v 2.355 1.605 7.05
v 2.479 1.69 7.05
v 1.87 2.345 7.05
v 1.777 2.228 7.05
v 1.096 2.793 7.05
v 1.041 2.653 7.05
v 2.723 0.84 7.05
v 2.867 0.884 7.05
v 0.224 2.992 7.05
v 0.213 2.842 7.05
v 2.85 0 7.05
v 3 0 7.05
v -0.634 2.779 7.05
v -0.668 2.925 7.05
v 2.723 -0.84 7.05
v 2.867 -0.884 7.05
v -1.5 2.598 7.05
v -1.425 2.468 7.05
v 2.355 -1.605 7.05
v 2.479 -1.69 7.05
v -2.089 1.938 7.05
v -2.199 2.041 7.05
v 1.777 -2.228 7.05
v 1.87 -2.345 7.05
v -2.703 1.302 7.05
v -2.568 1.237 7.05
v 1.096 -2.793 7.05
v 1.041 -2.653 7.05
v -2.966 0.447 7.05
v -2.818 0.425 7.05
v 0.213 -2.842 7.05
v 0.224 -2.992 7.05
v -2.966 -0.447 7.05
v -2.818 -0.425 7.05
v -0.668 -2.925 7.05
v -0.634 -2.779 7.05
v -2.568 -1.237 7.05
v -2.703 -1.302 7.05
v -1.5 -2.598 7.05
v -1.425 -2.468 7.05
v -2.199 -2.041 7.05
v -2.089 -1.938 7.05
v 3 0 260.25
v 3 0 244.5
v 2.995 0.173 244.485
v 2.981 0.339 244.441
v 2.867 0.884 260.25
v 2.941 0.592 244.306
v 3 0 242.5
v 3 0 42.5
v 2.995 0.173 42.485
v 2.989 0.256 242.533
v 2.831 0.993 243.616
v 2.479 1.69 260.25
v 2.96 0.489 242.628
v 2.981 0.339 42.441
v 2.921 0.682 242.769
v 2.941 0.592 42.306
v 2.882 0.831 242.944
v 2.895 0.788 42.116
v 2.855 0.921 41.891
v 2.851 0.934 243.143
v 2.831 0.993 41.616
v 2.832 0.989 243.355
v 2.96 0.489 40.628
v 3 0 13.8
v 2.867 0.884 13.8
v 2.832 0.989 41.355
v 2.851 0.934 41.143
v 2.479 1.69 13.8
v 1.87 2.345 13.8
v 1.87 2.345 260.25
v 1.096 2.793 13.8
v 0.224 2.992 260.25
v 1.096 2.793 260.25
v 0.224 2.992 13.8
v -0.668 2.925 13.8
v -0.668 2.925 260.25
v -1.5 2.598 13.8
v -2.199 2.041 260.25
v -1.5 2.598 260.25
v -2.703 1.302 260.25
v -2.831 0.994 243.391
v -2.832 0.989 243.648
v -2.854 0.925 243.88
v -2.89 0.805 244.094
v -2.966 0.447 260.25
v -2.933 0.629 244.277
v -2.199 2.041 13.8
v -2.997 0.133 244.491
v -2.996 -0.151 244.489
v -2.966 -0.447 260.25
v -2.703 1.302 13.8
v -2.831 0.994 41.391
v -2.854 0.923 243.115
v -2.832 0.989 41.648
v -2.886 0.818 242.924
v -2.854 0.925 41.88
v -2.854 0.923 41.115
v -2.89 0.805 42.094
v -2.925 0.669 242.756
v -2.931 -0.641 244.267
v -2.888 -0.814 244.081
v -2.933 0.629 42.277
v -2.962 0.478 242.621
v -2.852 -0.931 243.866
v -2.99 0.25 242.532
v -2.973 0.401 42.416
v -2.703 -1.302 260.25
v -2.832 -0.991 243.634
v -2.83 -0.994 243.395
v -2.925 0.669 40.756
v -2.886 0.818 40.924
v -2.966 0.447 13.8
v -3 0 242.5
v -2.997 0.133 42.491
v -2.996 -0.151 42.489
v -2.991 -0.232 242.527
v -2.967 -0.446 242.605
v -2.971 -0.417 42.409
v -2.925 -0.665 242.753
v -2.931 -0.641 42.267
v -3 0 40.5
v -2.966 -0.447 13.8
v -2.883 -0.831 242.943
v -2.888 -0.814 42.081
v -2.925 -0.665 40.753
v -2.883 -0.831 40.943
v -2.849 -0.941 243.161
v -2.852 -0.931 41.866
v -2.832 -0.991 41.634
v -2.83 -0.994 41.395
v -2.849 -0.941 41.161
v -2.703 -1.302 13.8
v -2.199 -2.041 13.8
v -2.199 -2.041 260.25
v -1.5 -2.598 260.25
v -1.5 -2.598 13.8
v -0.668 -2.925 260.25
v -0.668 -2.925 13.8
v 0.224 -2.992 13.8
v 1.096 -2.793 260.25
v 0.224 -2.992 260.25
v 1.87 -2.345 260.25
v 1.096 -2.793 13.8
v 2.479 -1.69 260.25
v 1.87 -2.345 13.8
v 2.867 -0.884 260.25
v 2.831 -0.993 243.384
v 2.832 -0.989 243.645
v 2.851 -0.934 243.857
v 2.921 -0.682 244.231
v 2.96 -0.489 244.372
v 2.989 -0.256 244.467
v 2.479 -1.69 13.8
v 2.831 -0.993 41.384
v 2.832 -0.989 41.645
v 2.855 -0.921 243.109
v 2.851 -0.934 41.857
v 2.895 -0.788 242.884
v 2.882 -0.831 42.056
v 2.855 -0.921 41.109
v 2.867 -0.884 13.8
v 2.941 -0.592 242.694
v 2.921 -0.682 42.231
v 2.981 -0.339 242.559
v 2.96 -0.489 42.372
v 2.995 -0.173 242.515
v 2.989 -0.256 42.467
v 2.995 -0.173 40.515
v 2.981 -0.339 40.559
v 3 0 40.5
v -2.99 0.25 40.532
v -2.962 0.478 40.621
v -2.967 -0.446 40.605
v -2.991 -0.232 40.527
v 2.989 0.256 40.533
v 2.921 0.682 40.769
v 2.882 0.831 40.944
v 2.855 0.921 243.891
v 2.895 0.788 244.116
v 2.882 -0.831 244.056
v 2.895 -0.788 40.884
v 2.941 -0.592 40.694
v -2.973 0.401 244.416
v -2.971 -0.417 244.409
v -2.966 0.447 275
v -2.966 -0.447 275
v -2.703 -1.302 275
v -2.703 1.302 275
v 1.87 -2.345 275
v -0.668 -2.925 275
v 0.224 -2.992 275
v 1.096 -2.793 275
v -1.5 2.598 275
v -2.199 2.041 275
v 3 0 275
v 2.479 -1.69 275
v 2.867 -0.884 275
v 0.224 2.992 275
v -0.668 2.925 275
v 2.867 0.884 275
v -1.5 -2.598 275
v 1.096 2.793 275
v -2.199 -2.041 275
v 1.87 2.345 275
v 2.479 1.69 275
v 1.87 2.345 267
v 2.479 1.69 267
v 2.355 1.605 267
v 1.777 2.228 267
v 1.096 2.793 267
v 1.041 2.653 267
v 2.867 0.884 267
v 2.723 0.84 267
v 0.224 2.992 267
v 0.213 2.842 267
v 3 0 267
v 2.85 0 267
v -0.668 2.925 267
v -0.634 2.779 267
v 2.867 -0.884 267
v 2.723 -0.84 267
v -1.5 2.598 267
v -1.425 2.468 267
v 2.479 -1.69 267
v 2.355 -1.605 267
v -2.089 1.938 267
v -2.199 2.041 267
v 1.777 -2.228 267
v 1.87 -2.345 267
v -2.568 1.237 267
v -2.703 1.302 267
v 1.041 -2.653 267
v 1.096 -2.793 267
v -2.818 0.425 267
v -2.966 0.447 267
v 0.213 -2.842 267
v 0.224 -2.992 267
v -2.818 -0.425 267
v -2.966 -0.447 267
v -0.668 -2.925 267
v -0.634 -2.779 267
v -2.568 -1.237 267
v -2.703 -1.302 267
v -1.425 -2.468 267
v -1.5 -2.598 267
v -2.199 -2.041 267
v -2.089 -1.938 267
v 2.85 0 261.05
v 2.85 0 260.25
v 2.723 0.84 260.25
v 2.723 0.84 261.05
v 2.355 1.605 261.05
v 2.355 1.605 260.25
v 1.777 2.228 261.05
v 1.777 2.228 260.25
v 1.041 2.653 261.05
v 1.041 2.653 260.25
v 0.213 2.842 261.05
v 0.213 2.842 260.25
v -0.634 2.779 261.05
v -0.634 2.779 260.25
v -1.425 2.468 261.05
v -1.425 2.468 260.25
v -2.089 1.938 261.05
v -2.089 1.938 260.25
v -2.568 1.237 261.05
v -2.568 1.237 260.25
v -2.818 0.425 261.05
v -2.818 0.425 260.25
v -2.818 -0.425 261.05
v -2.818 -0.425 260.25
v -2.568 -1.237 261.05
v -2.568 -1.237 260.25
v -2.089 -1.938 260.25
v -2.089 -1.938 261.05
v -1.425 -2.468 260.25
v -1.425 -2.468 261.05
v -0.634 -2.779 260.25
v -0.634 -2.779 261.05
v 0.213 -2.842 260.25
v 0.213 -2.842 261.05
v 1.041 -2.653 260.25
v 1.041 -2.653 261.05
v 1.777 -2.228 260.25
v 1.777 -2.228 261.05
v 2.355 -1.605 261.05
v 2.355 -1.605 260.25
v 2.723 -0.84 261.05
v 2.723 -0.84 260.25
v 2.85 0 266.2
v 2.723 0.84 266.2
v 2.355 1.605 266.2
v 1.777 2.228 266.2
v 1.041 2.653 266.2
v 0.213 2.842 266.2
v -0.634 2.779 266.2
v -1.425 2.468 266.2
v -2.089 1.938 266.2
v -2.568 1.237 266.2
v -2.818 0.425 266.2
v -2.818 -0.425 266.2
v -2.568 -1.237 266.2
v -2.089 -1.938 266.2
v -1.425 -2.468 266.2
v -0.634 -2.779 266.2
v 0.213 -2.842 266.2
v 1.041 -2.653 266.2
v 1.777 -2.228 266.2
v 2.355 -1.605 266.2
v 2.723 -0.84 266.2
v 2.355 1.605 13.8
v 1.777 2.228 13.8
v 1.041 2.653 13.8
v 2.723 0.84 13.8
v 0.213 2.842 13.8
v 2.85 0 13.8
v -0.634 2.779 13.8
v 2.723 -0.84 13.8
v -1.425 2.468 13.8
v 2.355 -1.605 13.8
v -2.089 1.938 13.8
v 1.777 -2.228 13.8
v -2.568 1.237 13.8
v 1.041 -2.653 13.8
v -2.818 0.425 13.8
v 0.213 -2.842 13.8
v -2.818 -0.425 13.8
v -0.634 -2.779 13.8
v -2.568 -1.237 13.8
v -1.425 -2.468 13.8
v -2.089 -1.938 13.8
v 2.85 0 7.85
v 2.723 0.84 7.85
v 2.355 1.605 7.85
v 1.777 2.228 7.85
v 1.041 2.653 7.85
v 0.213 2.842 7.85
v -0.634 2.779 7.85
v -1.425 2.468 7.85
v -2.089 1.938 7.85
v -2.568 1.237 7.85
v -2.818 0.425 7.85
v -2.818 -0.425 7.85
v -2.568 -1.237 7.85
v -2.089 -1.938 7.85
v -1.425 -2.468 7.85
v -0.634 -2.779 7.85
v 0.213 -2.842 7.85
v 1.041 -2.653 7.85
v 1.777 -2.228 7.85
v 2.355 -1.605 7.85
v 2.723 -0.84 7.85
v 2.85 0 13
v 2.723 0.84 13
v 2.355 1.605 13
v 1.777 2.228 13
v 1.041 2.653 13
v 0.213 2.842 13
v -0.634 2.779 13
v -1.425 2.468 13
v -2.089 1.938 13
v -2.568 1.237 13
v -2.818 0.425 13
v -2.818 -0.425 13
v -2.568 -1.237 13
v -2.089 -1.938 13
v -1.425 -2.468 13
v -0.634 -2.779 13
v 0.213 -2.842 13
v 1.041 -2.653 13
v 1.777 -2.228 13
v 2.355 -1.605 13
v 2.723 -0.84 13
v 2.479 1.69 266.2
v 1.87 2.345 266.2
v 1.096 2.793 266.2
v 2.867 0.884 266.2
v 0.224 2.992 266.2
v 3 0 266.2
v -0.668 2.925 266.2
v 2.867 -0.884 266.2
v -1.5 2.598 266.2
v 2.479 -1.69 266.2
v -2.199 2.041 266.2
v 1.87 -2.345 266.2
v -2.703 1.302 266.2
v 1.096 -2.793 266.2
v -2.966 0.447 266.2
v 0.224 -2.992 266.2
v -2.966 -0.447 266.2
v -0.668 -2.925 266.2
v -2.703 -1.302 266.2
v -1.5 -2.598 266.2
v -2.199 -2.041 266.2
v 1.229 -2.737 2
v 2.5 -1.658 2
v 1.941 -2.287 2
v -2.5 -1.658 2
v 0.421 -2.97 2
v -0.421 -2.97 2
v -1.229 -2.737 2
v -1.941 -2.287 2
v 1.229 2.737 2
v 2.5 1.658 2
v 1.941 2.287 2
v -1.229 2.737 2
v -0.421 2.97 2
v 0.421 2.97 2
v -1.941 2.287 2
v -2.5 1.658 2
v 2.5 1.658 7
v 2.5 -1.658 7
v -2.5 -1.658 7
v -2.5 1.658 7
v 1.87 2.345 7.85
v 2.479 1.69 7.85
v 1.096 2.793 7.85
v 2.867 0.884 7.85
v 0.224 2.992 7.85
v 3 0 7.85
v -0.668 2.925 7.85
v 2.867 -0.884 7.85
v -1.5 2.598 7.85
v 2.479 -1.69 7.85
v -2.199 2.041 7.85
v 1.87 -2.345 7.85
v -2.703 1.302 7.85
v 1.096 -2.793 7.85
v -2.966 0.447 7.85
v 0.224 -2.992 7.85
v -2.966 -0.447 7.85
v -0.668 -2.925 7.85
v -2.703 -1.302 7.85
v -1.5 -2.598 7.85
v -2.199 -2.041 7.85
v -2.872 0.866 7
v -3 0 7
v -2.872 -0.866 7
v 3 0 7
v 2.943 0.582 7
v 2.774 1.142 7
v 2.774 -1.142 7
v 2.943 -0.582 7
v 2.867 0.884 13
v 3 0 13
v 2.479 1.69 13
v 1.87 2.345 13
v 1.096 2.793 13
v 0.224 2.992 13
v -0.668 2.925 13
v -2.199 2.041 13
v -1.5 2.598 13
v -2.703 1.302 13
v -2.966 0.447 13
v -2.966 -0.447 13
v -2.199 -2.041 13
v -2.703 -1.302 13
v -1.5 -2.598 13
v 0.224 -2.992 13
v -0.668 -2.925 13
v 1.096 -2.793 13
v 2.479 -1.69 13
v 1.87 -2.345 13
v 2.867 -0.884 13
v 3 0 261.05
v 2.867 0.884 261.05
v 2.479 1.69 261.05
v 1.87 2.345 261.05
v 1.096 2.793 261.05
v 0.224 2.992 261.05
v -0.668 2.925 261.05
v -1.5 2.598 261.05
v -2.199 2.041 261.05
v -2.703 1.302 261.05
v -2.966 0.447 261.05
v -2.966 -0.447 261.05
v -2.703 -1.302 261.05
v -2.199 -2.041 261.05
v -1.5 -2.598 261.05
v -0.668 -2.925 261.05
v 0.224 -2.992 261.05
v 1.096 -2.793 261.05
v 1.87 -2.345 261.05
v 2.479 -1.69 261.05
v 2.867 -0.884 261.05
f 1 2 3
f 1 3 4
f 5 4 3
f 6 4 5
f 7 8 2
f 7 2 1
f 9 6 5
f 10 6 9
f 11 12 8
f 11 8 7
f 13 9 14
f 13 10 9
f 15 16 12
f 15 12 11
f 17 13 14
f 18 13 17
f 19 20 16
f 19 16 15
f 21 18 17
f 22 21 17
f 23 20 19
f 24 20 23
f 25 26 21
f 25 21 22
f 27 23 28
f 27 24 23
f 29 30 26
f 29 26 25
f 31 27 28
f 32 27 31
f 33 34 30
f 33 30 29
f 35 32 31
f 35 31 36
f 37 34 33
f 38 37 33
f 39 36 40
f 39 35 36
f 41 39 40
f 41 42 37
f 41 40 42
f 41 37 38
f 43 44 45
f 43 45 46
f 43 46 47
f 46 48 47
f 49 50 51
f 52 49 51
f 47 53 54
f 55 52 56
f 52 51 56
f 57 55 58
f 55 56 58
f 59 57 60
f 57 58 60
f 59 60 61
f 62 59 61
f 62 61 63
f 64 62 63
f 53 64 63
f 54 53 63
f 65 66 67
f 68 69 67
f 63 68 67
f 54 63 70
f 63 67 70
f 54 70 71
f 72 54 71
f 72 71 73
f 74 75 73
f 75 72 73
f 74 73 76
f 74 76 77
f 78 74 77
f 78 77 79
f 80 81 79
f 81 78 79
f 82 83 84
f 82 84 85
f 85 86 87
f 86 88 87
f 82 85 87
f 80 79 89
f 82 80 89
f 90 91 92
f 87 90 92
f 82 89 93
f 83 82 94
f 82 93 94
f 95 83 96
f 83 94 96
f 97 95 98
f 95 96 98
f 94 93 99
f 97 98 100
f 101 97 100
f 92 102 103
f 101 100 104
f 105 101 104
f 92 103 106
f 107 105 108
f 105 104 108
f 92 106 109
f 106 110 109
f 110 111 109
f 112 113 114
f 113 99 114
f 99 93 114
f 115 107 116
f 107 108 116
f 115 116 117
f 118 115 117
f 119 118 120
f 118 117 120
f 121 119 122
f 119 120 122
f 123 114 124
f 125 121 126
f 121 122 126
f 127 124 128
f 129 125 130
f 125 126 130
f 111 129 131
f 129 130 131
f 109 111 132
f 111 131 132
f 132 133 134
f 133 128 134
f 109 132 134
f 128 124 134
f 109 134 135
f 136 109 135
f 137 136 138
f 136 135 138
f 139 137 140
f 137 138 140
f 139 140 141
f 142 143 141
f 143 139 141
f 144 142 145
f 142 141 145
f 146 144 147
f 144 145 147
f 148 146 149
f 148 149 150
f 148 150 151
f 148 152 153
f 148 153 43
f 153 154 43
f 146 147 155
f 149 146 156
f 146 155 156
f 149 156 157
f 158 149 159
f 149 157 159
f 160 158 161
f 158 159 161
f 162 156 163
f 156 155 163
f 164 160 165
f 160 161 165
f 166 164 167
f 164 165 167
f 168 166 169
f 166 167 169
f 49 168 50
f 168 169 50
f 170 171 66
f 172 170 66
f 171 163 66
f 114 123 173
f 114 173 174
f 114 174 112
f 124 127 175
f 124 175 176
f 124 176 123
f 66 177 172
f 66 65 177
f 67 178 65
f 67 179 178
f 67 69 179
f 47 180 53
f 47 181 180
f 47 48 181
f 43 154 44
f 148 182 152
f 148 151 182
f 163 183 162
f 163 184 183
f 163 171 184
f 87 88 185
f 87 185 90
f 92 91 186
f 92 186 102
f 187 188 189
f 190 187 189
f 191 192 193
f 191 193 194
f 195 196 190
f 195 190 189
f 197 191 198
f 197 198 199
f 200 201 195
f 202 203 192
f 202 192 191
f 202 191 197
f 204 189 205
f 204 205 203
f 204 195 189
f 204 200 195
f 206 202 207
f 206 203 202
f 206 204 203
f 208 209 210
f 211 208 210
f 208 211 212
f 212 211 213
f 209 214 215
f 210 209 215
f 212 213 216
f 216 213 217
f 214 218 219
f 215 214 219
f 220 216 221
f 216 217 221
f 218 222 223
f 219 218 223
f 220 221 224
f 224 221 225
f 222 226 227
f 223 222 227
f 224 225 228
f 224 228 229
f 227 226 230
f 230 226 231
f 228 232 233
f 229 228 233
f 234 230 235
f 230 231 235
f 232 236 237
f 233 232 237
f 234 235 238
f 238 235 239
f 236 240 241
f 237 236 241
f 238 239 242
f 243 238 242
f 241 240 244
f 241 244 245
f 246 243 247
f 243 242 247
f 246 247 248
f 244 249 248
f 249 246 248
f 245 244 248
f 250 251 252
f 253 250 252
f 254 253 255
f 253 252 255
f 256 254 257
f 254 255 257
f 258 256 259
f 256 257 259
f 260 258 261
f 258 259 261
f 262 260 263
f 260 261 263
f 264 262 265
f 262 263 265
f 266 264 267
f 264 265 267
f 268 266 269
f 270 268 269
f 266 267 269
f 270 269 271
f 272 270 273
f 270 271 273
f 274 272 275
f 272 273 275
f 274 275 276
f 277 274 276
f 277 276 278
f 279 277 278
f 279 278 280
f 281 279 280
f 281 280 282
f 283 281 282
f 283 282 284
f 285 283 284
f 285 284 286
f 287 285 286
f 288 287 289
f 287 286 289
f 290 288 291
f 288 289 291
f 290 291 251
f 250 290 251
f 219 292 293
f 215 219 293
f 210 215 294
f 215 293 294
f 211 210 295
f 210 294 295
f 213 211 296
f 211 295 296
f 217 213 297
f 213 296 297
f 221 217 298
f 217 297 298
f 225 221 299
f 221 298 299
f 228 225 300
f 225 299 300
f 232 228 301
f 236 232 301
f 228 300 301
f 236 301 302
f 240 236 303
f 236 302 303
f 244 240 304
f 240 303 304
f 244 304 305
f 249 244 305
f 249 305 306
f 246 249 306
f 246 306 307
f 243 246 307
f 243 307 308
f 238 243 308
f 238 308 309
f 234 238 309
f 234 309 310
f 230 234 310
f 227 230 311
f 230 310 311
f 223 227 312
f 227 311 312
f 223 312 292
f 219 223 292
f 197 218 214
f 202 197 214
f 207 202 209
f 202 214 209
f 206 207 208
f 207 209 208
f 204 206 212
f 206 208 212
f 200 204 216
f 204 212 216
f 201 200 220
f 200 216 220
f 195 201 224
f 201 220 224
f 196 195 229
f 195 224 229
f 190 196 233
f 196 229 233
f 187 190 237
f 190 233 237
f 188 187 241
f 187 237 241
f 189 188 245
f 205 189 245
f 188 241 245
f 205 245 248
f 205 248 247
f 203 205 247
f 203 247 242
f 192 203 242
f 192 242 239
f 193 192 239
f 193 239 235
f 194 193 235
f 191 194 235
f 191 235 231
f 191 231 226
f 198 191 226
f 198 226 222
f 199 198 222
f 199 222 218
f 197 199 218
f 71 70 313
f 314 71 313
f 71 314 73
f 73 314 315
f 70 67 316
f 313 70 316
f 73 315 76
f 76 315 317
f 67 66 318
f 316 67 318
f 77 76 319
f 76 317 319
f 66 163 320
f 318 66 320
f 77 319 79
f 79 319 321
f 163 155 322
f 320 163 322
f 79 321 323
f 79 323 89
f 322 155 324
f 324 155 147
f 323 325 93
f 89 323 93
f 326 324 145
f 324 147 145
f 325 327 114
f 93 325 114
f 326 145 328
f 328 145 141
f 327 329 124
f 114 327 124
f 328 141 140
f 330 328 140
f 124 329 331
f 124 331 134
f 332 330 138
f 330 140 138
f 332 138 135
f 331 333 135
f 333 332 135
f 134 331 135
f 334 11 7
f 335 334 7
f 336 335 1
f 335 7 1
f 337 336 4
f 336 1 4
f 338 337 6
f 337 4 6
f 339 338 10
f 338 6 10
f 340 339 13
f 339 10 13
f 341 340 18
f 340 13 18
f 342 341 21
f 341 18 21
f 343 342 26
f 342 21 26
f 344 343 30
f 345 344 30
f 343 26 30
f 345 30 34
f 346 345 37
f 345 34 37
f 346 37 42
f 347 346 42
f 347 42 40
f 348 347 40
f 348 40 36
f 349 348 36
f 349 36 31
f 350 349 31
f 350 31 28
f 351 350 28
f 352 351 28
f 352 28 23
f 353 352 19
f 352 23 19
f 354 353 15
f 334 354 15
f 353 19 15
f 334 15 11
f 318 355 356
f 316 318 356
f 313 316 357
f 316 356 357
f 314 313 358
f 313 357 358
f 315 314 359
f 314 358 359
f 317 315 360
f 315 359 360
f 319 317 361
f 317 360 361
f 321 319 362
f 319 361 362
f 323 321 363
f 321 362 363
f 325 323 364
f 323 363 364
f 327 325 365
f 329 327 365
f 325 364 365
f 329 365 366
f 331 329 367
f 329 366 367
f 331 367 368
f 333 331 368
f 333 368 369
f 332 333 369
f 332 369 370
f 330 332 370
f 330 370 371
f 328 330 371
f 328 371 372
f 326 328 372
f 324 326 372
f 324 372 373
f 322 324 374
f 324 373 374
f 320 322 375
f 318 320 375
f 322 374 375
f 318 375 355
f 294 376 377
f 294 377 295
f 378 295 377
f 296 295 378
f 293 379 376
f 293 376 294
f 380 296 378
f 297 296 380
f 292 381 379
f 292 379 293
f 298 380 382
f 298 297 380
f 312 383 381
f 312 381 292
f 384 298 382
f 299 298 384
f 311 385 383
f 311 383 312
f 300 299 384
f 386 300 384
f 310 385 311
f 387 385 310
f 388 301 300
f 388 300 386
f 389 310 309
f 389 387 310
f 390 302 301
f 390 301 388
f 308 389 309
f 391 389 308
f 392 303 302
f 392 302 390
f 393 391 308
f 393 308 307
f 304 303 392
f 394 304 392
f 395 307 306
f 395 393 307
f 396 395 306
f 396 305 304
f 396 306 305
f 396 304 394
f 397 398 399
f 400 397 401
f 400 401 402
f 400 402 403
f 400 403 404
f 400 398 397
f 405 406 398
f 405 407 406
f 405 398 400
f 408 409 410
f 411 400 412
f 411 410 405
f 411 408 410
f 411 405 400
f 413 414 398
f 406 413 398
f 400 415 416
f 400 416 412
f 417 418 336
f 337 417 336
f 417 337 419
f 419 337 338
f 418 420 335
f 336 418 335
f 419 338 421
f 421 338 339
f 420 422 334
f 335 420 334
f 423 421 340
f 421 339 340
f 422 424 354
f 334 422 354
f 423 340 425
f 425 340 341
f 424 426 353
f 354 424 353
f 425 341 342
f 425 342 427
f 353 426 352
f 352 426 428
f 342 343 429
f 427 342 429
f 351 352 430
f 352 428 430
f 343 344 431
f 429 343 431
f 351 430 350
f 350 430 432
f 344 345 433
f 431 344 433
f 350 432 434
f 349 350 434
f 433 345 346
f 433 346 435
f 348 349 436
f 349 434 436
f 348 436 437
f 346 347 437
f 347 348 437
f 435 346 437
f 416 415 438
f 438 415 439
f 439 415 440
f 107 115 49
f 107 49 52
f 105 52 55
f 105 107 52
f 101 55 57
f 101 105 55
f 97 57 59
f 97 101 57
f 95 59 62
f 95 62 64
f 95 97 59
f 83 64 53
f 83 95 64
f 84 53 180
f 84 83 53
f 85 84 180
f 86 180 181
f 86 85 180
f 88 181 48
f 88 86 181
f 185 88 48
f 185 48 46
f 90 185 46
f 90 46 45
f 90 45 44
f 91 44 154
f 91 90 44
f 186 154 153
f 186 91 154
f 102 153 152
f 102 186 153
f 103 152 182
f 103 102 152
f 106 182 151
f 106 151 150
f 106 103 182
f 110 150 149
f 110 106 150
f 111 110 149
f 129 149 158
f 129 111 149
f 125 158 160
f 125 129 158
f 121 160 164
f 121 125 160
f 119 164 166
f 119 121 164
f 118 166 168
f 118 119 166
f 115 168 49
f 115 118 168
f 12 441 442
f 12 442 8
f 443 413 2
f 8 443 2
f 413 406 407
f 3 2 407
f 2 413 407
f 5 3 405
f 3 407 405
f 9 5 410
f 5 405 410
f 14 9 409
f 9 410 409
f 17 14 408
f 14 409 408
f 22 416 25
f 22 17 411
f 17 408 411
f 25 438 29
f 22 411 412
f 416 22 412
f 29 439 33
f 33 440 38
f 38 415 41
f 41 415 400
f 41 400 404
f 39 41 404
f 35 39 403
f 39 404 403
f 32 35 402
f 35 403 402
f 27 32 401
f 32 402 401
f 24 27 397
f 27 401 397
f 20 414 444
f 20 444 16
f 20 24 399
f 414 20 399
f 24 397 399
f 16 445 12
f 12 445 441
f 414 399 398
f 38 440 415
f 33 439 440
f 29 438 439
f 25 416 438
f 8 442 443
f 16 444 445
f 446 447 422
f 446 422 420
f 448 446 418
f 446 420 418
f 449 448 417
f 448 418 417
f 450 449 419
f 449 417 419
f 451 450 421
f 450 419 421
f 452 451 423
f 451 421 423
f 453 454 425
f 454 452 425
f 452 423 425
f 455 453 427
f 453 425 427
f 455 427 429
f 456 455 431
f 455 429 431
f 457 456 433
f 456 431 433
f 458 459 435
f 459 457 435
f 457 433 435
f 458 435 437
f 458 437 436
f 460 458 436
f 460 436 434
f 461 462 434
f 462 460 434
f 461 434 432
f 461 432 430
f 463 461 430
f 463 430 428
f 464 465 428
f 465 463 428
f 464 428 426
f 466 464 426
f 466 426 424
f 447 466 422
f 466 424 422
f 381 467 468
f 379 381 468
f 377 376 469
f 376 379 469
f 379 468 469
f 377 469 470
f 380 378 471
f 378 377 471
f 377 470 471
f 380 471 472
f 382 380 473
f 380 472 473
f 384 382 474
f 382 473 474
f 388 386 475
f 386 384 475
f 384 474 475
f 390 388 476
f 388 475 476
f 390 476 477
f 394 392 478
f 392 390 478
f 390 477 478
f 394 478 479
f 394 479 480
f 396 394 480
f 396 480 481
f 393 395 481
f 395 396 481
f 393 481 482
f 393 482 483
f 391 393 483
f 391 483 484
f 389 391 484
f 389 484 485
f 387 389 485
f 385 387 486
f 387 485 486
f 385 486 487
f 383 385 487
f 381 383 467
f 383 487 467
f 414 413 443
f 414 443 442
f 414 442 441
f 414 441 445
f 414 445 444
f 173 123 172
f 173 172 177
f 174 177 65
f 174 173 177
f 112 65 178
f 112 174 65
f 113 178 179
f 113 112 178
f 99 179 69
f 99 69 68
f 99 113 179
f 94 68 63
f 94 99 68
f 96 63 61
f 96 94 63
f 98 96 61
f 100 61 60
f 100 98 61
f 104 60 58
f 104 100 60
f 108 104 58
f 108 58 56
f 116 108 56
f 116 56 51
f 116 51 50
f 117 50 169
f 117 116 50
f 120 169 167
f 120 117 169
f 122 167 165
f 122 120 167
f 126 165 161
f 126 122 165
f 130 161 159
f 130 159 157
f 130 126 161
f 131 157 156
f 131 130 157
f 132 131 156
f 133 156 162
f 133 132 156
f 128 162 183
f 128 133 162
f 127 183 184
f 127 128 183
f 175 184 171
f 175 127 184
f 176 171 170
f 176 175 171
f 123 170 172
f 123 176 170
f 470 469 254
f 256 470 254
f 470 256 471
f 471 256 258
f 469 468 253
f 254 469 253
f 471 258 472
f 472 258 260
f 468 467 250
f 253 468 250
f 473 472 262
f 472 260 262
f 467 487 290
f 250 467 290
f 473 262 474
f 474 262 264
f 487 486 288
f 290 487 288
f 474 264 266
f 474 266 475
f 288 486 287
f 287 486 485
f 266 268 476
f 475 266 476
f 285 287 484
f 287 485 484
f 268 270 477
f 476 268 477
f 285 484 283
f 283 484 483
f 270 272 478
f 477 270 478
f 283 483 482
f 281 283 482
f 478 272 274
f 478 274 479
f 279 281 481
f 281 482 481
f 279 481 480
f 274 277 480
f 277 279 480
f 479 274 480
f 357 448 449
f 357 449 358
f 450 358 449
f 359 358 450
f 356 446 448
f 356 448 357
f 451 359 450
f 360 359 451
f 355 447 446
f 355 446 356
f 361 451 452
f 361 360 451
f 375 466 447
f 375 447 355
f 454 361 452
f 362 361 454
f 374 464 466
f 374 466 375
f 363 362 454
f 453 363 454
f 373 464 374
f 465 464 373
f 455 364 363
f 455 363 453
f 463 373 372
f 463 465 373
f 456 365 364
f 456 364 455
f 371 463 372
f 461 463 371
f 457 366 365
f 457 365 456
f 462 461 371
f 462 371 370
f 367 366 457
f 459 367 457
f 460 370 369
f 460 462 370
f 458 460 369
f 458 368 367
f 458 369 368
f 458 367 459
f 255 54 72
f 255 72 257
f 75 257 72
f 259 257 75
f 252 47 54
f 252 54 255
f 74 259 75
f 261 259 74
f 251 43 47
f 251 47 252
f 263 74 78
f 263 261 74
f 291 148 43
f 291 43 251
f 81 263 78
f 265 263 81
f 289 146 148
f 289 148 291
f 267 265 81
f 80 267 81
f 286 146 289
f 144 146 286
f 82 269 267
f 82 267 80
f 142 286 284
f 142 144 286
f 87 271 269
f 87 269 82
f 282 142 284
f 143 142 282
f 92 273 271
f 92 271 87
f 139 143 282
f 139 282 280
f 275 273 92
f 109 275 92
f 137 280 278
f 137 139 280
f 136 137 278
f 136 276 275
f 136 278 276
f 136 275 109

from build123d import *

# Parameters (mm, degrees)
SKETCH1_R                                 = 3
BOSS_EXTRUDE1_DEPTH                       = 275
SKETCH3_W                                 = 0.8
SKETCH3_H                                 = 0.5
CUT_EXTRUDE2_DEPTH                        = 276.032725326
CUT_EXTRUDE2_DEPTH_BACK                   = 276.032725326
SKETCH4_W                                 = 3.470061058
SKETCH4_H                                 = 7
SKETCH4_W_2                               = 2.92528695
CHAMFER1_SIZE                             = 0.3
RETAINING_GROOVES_D5P7_1_START            = 7.05
SKETCH5_R                                 = 2.85
SKETCH5_R_2                               = 2.49
RETAINING_GROOVES_D5P7_1_DEPTH            = 0.8
RETAINING_GROOVES_D5P7_2_START            = 13
SKETCH6_R                                 = 2.85
SKETCH6_R_2                               = 2.49
RETAINING_GROOVES_D5P7_2_DEPTH            = 0.8
RETAINING_GROOVES_D5P7_3_START            = 260.25
SKETCH7_R                                 = 2.85
SKETCH7_R_2                               = 2.49
RETAINING_GROOVES_D5P7_3_DEPTH            = 0.8
RETAINING_GROOVES_D5P7_4_START            = 266.2
SKETCH8_R                                 = 2.85
SKETCH8_R_2                               = 2.49
RETAINING_GROOVES_D5P7_4_DEPTH            = 0.8
TWO_HUB_CROSS_PIN_D2_DEPTH                = 276.032725326
TWO_HUB_CROSS_PIN_D2_DEPTH_BACK           = 276.032725326
SKETCH9_R                                 = 1
SKETCH10_R                                = 3.1
REVB_LOWER_SHAFT_NOSE_CLEARANCE_2MM_DEPTH = 2


with BuildPart() as part:
    # Sketch1 → Boss-Extrude1 (new body)
    with BuildSketch(Plane.XY):
        Circle(SKETCH1_R)
    extrude(amount=BOSS_EXTRUDE1_DEPTH)

    # Sketch3 → Cut-Revolve1 (revolve, cut)
    with BuildSketch(Plane(origin=(0, 0, 0), x_dir=(0, 0, -1), z_dir=(1, 0, 0)), mode=Mode.PRIVATE) as cut_revolve1_sk:
        with Locations((-266.6, 2.75)):
            Rectangle(SKETCH3_W, SKETCH3_H)
        with Locations((-260.65, 2.75)):
            Rectangle(SKETCH3_W, SKETCH3_H)
        with Locations((-13.4, 2.75)):
            Rectangle(SKETCH3_W, SKETCH3_H)
        with Locations((-7.45, 2.75)):
            Rectangle(SKETCH3_W, SKETCH3_H)
    revolve(cut_revolve1_sk.sketch.rotate(Axis((0, 0, 263.365004794), (0, 0, -1)), 90), axis=Axis((0, 0, 263.365004794), (0, 0, -1)), mode=Mode.SUBTRACT)

    # Sketch4 → Cut-Extrude2 (cut, two sides: drawn at the far end of the back side and taken through both)
    with BuildSketch(Plane(origin=(0, 0, 0), x_dir=(1, 0, 0), z_dir=(0, 1, 0)).offset(-CUT_EXTRUDE2_DEPTH_BACK)):
        with Locations((4.235030529, -3.5)):
            Rectangle(SKETCH4_W, SKETCH4_H)
        with Locations((-3.962643475, -3.5)):
            Rectangle(SKETCH4_W_2, SKETCH4_H)
    extrude(amount=CUT_EXTRUDE2_DEPTH + CUT_EXTRUDE2_DEPTH_BACK, mode=Mode.SUBTRACT)

    # Chamfer1
    chamfer1_edges = [part.edges().sort_by_distance(p)[0] for p in [
        (0, 3, 0),
        (0, -3, 0),
    ]]
    chamfer(chamfer1_edges, length=CHAMFER1_SIZE)

    # Sketch5 → Retaining_Grooves_D5p7_1 (add)
    with BuildSketch(Plane.XY.offset(RETAINING_GROOVES_D5P7_1_START)):
        Circle(SKETCH5_R)
        Circle(SKETCH5_R_2, mode=Mode.SUBTRACT)
    extrude(amount=RETAINING_GROOVES_D5P7_1_DEPTH)

    # Sketch6 → Retaining_Grooves_D5p7_2 (add)
    with BuildSketch(Plane.XY.offset(RETAINING_GROOVES_D5P7_2_START)):
        Circle(SKETCH6_R)
        Circle(SKETCH6_R_2, mode=Mode.SUBTRACT)
    extrude(amount=RETAINING_GROOVES_D5P7_2_DEPTH)

    # Sketch7 → Retaining_Grooves_D5p7_3 (add)
    with BuildSketch(Plane.XY.offset(RETAINING_GROOVES_D5P7_3_START)):
        Circle(SKETCH7_R)
        Circle(SKETCH7_R_2, mode=Mode.SUBTRACT)
    extrude(amount=RETAINING_GROOVES_D5P7_3_DEPTH)

    # Sketch8 → Retaining_Grooves_D5p7_4 (add)
    with BuildSketch(Plane.XY.offset(RETAINING_GROOVES_D5P7_4_START)):
        Circle(SKETCH8_R)
        Circle(SKETCH8_R_2, mode=Mode.SUBTRACT)
    extrude(amount=RETAINING_GROOVES_D5P7_4_DEPTH)

    # Sketch9 → Two_Hub_Cross_Pin_D2 (cut, two sides: drawn at the far end of the back side and taken through both)
    with BuildSketch(Plane(origin=(0, 0, 0), x_dir=(0, 0, -1), z_dir=(1, 0, 0)).offset(-TWO_HUB_CROSS_PIN_D2_DEPTH_BACK)):
        with Locations((-41.5, 0)):
            Circle(SKETCH9_R)
        with Locations((-243.5, 0)):
            Circle(SKETCH9_R)
    extrude(amount=TWO_HUB_CROSS_PIN_D2_DEPTH + TWO_HUB_CROSS_PIN_D2_DEPTH_BACK, mode=Mode.SUBTRACT)

    # Sketch10 → RevB_Lower_Shaft_Nose_Clearance_2mm (cut)
    with BuildSketch(Plane(origin=(0, 0, 0), x_dir=(-1, 0, 0), z_dir=(0, 0, -1))):
        Circle(SKETCH10_R)
    extrude(amount=-REVB_LOWER_SHAFT_NOSE_CLEARANCE_2MM_DEPTH, mode=Mode.SUBTRACT)


solid = part.part
